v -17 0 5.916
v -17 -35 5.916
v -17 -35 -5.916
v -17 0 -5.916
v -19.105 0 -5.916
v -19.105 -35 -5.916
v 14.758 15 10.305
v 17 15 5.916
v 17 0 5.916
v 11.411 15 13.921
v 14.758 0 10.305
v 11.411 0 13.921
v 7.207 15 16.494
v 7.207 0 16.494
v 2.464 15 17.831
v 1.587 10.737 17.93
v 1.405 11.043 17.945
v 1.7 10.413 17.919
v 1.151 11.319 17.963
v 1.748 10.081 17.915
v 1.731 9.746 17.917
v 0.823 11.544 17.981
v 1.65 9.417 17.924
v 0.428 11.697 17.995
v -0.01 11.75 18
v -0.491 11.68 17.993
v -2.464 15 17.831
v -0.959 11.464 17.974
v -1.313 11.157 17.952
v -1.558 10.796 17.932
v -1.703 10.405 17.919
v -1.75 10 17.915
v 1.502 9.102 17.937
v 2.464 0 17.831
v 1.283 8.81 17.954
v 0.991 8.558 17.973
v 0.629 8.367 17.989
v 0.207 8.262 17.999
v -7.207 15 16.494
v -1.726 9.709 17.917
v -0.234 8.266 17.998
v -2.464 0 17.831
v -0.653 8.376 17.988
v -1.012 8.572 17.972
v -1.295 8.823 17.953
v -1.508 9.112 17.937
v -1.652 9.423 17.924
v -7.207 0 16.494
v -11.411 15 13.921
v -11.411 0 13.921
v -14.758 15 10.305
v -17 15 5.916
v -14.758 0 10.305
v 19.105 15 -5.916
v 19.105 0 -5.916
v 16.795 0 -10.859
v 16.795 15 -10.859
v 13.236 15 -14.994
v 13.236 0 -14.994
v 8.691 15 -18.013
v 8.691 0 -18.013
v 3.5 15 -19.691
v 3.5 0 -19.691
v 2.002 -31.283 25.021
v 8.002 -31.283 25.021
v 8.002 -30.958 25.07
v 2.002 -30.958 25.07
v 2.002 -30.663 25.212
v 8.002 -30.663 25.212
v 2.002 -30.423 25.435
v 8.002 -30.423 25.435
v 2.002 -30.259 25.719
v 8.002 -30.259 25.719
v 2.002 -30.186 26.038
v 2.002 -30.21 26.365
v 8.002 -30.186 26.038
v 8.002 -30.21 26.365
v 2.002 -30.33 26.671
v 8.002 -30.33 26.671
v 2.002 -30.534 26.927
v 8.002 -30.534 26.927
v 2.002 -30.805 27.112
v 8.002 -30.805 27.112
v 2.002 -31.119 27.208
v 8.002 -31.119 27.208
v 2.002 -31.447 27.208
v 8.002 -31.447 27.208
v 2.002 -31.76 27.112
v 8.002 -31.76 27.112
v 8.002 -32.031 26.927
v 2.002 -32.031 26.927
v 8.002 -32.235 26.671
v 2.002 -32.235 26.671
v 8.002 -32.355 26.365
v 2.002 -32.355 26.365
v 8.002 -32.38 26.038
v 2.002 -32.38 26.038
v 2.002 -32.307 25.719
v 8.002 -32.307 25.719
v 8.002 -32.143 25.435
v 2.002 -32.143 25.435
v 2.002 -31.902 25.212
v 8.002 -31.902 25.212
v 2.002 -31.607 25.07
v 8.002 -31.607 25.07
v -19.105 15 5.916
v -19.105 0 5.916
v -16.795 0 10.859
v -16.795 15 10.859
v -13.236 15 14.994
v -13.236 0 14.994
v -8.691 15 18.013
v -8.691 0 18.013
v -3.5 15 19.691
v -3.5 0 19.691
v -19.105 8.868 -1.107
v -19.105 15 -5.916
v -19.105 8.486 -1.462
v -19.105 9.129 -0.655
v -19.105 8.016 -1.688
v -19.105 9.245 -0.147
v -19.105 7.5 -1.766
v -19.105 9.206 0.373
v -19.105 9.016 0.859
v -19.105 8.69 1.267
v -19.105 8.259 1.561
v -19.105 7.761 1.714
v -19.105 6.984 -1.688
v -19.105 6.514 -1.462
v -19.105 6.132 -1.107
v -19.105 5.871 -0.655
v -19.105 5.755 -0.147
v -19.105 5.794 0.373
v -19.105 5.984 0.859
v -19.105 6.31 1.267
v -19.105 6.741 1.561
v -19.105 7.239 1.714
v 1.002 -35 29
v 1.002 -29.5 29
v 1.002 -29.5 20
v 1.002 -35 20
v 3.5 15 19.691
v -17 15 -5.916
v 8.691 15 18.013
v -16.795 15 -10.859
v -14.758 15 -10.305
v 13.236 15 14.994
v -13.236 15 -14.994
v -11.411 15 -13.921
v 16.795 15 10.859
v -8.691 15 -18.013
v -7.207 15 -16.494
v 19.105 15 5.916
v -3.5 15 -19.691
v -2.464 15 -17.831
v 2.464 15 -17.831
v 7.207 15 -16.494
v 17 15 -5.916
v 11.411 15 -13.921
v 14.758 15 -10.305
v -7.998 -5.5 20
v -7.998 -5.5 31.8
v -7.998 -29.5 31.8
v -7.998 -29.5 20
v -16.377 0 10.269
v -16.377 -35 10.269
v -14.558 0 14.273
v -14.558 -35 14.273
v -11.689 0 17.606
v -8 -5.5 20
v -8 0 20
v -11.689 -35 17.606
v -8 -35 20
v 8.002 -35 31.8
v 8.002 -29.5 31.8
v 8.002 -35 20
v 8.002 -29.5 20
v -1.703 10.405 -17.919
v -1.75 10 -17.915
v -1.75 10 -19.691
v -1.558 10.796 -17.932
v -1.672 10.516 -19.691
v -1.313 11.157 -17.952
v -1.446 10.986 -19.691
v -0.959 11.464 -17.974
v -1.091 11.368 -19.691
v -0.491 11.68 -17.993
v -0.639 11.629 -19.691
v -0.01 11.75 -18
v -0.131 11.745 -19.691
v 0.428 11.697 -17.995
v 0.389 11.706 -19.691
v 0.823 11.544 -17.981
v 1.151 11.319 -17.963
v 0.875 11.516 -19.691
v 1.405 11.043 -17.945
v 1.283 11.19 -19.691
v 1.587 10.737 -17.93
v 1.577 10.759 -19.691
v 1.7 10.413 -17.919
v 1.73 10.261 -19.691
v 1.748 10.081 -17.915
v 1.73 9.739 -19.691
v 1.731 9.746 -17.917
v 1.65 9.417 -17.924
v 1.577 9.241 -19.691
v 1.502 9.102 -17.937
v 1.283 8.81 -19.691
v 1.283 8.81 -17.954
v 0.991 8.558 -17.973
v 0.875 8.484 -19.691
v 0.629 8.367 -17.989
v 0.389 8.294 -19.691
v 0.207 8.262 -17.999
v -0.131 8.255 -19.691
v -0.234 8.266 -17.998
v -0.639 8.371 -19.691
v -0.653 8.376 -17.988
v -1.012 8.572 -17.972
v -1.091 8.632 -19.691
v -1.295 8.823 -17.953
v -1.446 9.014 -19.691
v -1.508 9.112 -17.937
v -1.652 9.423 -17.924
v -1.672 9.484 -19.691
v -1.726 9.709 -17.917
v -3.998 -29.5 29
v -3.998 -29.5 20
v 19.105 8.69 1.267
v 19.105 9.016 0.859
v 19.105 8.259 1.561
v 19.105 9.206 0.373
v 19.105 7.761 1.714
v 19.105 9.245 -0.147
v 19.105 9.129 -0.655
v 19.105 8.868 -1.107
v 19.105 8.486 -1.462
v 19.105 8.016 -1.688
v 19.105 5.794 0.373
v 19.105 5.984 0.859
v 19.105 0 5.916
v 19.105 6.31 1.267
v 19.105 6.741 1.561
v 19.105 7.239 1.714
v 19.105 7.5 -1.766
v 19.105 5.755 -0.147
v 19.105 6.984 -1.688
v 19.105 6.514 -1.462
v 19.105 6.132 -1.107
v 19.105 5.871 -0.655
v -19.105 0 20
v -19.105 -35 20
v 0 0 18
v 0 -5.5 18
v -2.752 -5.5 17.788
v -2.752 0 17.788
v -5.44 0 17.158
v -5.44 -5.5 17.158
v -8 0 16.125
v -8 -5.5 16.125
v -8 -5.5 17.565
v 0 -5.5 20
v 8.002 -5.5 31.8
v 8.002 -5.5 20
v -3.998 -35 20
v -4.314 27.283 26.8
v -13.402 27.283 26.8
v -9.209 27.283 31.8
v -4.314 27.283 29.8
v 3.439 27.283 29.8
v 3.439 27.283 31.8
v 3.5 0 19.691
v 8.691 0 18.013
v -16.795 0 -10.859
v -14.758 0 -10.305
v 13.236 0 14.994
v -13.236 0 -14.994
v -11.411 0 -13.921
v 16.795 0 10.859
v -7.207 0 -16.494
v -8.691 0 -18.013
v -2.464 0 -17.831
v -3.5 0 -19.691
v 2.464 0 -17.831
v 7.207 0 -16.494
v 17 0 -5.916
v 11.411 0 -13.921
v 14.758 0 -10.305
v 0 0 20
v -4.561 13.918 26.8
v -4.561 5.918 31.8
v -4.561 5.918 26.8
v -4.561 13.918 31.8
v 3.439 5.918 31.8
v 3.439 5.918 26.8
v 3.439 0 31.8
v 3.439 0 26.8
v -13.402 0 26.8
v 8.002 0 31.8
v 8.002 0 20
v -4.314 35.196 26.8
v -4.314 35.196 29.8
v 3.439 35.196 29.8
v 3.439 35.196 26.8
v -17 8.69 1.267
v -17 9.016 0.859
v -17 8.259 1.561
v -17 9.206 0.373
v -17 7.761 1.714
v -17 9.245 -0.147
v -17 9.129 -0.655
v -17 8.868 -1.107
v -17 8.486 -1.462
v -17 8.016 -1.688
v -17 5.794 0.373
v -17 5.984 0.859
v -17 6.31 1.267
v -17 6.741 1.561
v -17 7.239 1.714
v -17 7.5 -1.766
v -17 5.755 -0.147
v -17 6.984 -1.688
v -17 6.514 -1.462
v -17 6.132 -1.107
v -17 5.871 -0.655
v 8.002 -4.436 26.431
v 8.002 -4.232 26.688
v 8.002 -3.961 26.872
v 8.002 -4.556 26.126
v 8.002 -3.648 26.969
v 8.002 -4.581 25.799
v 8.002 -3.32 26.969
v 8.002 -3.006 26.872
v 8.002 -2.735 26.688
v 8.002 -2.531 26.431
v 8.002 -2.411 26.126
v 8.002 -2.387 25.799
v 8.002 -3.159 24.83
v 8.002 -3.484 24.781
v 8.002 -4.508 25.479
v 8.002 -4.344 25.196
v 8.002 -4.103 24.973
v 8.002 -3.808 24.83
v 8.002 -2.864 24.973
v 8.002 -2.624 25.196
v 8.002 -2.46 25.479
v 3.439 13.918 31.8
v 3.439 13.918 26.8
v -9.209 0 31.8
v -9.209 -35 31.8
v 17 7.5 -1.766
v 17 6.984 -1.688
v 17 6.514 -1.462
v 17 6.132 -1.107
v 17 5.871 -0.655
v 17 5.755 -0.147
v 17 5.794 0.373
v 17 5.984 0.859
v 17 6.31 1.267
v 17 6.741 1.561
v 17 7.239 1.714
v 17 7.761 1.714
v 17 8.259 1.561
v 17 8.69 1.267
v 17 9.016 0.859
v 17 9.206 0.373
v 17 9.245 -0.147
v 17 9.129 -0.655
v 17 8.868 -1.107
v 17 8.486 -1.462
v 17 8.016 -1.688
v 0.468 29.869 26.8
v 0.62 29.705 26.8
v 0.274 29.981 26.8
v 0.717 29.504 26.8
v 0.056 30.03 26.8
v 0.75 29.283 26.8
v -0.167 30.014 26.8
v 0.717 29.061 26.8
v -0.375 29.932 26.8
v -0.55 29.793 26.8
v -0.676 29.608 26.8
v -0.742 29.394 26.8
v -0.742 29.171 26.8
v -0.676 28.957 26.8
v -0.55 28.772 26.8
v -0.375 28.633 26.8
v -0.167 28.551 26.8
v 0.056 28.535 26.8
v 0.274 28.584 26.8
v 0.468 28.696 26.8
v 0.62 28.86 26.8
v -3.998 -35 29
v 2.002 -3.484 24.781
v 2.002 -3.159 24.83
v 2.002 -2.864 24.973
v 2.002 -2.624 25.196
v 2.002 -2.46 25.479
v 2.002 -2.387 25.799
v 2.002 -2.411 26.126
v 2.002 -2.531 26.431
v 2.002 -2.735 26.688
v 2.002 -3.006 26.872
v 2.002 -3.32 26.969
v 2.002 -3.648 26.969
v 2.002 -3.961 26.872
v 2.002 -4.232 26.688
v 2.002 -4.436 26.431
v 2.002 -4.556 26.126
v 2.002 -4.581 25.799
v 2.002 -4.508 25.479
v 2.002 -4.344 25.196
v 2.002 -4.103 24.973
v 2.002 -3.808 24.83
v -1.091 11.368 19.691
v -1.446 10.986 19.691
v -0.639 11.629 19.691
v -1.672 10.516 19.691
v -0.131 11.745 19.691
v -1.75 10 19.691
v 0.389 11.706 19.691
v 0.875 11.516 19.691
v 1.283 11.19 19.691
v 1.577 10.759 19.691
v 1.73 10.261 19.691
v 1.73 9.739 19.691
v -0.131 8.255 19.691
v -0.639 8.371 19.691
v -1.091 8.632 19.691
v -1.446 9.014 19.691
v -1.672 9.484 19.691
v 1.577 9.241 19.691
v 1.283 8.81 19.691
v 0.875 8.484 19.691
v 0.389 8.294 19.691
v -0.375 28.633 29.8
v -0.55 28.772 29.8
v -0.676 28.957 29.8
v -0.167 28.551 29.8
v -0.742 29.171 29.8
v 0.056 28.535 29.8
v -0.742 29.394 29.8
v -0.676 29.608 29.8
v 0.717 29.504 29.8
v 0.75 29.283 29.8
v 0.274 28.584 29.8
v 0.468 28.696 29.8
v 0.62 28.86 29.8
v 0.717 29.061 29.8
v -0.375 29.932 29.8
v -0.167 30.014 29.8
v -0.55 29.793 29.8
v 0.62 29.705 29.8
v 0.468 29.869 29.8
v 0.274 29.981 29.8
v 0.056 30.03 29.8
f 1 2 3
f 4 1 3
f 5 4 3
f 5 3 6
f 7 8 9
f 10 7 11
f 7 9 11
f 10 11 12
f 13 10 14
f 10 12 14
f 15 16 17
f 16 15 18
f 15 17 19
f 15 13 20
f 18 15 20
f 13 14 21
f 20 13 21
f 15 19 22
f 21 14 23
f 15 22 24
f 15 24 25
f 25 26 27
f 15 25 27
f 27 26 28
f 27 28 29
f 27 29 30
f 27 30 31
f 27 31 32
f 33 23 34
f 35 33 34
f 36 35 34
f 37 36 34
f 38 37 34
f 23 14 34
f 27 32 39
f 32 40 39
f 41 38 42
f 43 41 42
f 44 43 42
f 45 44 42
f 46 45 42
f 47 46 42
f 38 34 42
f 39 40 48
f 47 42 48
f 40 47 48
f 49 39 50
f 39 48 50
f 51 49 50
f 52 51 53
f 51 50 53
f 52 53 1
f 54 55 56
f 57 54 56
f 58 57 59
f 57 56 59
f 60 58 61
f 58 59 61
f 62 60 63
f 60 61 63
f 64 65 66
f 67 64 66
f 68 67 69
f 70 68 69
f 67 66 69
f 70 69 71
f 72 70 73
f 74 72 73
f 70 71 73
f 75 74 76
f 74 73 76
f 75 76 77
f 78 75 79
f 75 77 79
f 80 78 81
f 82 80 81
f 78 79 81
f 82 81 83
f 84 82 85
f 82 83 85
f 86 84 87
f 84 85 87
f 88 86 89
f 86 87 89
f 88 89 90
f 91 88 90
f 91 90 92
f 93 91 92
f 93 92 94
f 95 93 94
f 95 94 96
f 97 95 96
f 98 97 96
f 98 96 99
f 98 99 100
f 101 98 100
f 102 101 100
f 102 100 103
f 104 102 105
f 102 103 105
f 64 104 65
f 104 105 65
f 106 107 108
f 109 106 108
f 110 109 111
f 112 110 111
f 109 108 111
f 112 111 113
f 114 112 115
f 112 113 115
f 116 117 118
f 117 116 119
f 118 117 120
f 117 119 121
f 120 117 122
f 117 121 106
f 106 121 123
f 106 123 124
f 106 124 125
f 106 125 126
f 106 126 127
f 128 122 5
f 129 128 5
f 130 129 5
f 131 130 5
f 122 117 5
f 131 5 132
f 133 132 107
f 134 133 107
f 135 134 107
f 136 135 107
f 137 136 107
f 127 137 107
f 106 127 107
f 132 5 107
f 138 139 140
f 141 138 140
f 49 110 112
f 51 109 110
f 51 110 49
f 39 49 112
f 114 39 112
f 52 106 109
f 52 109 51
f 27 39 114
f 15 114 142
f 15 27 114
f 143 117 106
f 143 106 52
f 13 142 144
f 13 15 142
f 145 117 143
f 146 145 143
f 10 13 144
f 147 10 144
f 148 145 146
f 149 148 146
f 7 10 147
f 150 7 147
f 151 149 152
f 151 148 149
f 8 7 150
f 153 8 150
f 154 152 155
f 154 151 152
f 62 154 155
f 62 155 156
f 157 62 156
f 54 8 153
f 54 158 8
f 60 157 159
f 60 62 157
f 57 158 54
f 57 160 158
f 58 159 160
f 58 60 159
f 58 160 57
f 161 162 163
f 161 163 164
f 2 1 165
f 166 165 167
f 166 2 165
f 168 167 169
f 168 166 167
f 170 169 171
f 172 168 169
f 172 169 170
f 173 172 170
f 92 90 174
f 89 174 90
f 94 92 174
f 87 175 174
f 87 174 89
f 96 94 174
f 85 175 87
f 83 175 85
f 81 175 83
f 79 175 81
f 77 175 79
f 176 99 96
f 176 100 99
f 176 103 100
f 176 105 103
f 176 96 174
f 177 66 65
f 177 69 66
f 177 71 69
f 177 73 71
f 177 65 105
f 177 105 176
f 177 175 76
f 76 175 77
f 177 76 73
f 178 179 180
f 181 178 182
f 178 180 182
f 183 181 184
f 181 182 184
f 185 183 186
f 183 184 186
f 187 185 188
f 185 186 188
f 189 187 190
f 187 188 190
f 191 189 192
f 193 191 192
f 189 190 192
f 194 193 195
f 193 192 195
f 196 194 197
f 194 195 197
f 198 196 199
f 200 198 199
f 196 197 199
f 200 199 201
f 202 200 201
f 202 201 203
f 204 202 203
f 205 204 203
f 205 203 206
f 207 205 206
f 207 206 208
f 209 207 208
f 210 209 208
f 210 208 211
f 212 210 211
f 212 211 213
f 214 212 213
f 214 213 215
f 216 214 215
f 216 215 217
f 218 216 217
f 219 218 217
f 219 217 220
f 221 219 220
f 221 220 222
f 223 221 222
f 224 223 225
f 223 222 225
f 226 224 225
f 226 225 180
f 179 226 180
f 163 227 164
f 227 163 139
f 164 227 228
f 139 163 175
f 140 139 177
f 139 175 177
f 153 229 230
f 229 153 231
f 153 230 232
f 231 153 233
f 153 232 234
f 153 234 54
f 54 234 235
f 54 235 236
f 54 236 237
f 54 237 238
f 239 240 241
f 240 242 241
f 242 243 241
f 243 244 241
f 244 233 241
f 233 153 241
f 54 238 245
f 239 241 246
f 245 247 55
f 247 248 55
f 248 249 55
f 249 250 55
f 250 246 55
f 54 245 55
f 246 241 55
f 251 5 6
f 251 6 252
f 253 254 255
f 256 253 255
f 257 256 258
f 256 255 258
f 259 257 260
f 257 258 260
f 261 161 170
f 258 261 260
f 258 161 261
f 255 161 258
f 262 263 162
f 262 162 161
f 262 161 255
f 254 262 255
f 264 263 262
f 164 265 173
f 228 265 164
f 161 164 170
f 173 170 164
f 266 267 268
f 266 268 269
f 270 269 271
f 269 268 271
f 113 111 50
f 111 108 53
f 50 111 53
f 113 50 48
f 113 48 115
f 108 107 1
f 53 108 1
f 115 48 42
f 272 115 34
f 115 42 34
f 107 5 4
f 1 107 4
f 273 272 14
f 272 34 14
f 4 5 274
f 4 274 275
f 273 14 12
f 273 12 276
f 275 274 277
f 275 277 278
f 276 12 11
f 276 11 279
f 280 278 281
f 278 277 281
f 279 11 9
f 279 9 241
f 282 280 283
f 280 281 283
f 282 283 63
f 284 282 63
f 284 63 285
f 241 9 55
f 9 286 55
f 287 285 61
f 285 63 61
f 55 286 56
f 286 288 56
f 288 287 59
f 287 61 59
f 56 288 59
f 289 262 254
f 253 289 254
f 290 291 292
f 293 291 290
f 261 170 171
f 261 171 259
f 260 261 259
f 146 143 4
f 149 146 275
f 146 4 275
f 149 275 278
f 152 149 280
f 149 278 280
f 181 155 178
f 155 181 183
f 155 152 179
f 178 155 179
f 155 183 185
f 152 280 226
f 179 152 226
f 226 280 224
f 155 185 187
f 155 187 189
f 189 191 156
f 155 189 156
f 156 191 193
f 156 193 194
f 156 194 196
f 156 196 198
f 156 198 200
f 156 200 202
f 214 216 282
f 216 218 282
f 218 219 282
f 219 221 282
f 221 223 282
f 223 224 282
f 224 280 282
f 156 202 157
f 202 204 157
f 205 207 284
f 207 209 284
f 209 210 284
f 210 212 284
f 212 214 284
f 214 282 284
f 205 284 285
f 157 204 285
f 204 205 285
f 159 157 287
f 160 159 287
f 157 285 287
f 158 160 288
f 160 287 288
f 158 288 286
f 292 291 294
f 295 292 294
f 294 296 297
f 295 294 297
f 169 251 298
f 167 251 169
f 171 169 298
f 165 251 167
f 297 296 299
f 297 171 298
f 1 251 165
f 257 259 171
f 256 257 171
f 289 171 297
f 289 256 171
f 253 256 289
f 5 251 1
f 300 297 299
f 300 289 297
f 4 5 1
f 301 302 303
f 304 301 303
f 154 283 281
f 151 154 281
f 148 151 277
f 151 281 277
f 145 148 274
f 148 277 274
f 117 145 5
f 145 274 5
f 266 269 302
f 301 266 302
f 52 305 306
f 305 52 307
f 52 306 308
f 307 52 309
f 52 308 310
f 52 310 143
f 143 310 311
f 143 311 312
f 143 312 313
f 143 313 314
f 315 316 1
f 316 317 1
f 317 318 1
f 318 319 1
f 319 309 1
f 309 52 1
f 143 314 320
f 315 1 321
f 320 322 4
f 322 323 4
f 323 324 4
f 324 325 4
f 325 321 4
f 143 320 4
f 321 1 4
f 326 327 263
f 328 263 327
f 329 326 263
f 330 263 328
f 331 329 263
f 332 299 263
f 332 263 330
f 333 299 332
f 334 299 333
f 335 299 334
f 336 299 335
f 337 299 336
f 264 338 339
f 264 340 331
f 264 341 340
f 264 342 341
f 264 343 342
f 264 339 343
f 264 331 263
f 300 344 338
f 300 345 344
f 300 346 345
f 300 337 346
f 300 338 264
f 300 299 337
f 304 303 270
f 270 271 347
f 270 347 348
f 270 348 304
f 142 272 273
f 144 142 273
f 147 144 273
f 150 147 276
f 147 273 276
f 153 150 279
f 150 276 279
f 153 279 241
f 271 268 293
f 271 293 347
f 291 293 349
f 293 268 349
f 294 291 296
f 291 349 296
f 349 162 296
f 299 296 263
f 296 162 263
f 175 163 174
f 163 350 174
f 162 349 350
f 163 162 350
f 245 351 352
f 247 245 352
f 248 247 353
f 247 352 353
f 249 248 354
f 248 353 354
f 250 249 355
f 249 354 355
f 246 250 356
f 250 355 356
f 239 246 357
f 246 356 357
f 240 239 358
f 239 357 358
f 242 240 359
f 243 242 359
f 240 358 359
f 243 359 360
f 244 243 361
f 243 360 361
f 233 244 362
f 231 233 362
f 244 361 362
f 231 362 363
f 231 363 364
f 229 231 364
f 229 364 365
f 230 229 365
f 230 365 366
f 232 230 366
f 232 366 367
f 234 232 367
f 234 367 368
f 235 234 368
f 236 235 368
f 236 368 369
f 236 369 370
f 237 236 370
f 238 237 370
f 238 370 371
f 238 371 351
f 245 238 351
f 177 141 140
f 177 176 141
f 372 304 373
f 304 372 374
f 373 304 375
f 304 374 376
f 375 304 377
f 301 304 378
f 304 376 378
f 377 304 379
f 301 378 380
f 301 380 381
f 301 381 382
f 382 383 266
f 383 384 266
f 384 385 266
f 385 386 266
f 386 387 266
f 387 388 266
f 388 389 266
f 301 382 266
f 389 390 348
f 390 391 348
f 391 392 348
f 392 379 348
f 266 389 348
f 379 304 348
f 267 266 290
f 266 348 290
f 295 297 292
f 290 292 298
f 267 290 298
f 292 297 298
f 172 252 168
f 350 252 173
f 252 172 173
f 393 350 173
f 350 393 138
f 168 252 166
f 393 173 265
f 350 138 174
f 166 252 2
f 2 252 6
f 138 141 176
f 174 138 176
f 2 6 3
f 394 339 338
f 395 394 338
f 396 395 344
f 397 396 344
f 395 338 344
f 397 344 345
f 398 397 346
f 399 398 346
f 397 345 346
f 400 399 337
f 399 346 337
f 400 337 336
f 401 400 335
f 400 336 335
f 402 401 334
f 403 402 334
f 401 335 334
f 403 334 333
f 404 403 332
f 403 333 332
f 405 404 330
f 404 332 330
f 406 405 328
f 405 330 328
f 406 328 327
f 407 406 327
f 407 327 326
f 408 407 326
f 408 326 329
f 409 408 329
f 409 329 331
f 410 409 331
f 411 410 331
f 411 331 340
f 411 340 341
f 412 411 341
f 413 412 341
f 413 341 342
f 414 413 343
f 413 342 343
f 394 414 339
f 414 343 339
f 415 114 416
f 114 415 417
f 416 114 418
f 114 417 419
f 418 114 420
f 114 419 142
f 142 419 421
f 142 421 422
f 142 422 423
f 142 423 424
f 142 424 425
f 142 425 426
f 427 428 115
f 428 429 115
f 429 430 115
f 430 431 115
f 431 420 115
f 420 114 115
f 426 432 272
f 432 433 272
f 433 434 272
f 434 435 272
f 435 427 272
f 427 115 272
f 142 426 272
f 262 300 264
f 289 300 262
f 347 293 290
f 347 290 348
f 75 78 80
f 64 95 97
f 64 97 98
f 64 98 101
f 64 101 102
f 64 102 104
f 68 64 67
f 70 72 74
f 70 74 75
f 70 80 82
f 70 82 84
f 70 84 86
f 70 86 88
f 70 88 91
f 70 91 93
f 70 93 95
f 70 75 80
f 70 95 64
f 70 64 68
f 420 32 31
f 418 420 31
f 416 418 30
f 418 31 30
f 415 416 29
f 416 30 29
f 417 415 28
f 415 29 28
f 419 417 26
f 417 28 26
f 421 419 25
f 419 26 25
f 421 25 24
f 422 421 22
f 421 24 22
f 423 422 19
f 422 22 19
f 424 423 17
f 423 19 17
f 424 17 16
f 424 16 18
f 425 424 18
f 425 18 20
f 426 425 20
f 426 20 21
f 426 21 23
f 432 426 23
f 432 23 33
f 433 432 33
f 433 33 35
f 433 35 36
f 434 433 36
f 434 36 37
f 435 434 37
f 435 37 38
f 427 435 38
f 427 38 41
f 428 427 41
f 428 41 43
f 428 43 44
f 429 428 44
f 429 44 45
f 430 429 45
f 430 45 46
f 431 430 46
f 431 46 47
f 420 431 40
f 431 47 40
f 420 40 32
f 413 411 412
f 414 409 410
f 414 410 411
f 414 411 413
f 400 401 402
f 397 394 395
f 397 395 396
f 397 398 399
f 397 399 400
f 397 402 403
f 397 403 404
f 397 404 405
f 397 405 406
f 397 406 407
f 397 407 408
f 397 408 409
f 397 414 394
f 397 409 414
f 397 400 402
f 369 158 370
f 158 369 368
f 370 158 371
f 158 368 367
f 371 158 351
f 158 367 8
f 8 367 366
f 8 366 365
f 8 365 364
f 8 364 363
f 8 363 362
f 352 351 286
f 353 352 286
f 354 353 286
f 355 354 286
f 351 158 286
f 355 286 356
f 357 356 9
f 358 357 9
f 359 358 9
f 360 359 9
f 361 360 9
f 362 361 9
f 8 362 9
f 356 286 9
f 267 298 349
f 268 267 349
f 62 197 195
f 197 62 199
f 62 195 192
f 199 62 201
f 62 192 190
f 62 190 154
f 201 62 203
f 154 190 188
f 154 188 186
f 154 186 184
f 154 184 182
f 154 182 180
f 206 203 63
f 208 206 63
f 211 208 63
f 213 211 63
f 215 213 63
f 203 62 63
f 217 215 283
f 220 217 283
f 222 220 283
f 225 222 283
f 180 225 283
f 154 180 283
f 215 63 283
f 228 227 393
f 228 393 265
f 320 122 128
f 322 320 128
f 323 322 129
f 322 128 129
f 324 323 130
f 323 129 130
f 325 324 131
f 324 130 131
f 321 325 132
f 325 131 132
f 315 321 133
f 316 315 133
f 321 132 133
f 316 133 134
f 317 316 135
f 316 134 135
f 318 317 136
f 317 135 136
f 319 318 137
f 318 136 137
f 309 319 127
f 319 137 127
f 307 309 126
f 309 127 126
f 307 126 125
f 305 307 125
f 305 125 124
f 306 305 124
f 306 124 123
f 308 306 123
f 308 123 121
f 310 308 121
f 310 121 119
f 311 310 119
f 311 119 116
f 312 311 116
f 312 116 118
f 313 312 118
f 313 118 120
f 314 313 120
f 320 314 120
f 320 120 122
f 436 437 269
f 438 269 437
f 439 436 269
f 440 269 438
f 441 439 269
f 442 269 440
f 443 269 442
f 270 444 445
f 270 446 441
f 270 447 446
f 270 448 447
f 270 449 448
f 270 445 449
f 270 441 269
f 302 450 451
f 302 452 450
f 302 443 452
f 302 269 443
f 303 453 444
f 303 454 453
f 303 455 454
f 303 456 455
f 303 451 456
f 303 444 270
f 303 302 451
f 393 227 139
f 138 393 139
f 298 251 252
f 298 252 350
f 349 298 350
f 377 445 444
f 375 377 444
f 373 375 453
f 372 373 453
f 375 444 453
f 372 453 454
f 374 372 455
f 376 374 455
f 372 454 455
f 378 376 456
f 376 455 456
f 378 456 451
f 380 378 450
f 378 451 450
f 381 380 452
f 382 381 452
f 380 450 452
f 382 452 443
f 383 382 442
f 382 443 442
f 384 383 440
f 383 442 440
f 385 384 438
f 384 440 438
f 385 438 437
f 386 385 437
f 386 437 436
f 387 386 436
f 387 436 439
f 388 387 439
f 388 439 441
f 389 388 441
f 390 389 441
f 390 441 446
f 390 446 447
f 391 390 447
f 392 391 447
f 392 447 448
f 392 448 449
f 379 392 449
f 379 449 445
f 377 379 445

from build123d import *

# Parameters (mm, degrees)
BOSS_EXTRUDE2_DEPTH = 15
BOSS_EXTRUDE3_DEPTH = 35
BOSS_EXTRUDE4_START = -35
BOSS_EXTRUDE4_DEPTH = 35
SKETCH2_W           = 11.8
SKETCH2_H           = 24
CUT_EXTRUDE1_DEPTH  = 16
SKETCH5_W           = 2.43477795
SKETCH5_H           = 29.688989587
CUT_EXTRUDE7_DEPTH  = 8
SKETCH6_W           = 4.317840387
SKETCH6_H           = 1.457155793
CUT_EXTRUDE8_DEPTH  = 29.5
BOSS_EXTRUDE6_DEPTH = 40
SKETCH8_W           = 7.752712761
SKETCH8_H           = 12.717464329
CUT_EXTRUDE9_DEPTH  = 2
CUT_EXTRUDE10_START = -15
CUT_EXTRUDE10_DEPTH = 15
SKETCH10_W          = 5
SKETCH10_H          = 9
CUT_EXTRUDE11_DEPTH = 10
SKETCH11_W          = 9.088902154
SKETCH11_H          = 12.717464329
CUT_EXTRUDE12_DEPTH = 5
SKETCH12_R          = 1.75
CUT_EXTRUDE13_DEPTH = 40
CUT_EXTRUDE14_DEPTH = 35
SKETCH15_R          = 1.75
CUT_EXTRUDE15_DEPTH = 60
SKETCH17_R          = 1.1
CUT_EXTRUDE17_DEPTH = 6
SKETCH18_R          = 1.1
CUT_EXTRUDE18_DEPTH = 6
SKETCH20_W          = 7.752712761
SKETCH20_H          = 4.803785243
CUT_EXTRUDE19_DEPTH = 5
SKETCH19_R          = 0.75
CUT_EXTRUDE20_DEPTH = 5
SKETCH21_W          = 8
SKETCH21_H          = 8
CUT_EXTRUDE21_DEPTH = 10


with BuildPart() as part:
    # Sketch1 → Boss-Extrude2 (new body)
    with BuildSketch(Plane(origin=(0, 0, 0), x_dir=(1, 0, 0), z_dir=(0, 1, 0))):
        with BuildLine():
            ThreePointArc((-3.5, 19.691368668), (-13.235779124, 14.993803753), (-19.104973175, 5.916079783))
            Line((-19.104973175, 5.916079783), (-19.104973175, -5.916079783))
            ThreePointArc((-19.104973175, -5.916079783), (0, -20), (19.104973175, -5.916079783))
            Line((19.104973175, -5.916079783), (19.104973175, 5.916079783))
            ThreePointArc((19.104973175, 5.916079783), (13.235779124, 14.993803753), (3.5, 19.691368668))
            Line((3.5, 19.691368668), (-3.5, 19.691368668))
        make_face()
        with BuildLine():
            ThreePointArc((-17, 5.916079783), (0, 18), (17, 5.916079783))
            Line((17, 5.916079783), (17, -5.916079783))
            ThreePointArc((17, -5.916079783), (0, -18), (-17, -5.916079783))
            Line((-17, -5.916079783), (-17, 5.916079783))
        make_face(mode=Mode.SUBTRACT)
    extrude(amount=BOSS_EXTRUDE2_DEPTH)

    # Sketch9 → Cut-Extrude10 (cut)
    with BuildSketch(Plane(origin=(0, 15, 0), x_dir=(1, 0, 0), z_dir=(0, 1, 0)).offset(CUT_EXTRUDE10_START)):
        with BuildLine():
            Line((-3.5, -19.691368668), (3.5, -19.691368668))
            ThreePointArc((3.5, -19.691368668), (0, -20), (-3.5, -19.691368668))
        make_face()
    extrude(amount=CUT_EXTRUDE10_DEPTH, mode=Mode.SUBTRACT)

    # Sketch12 → Cut-Extrude13 (cut)
    with BuildSketch(Plane.ZY.offset(19.104973175)):
        with Locations((-0.016079783, 7.5)):
            Circle(SKETCH12_R)
    extrude(amount=-CUT_EXTRUDE13_DEPTH, mode=Mode.SUBTRACT)

    # Sketch15 → Cut-Extrude15 (cut)
    with BuildSketch(Plane(origin=(0, 0, -19.691368668), x_dir=(-1, 0, 0), z_dir=(0, 0, -1))):
        with Locations((0, 10)):
            Circle(SKETCH15_R)
    extrude(amount=-CUT_EXTRUDE15_DEPTH, mode=Mode.SUBTRACT)


with BuildPart() as body_2:
    # Sketch1<3> → Boss-Extrude3 (new body)
    with BuildSketch(Plane(origin=(0, 0, 0), x_dir=(1, 0, 0), z_dir=(0, 1, 0))):
        with BuildLine():
            Line((8.001725225, -20), (0, -20))
            ThreePointArc((0, -20), (-11.867569345, -16.09847191), (-19.104973175, -5.916079783))
            Line((-19.104973175, -5.916079783), (-19.104973175, -20))
            Line((-19.104973175, -20), (-9.209366103, -31.8))
            Line((-9.209366103, -31.8), (8.001725225, -31.8))
            Line((8.001725225, -31.8), (8.001725225, -20))
        make_face()
    extrude(amount=-BOSS_EXTRUDE3_DEPTH)

    # Sketch1<4> → Boss-Extrude4 (add)
    with BuildSketch(Plane(origin=(0, 0, 0), x_dir=(1, 0, 0), z_dir=(0, 1, 0)).offset(BOSS_EXTRUDE4_START)):
        with BuildLine():
            Line((-17, -5.916079783), (-17, 5.916079783))
            Line((-17, 5.916079783), (-19.104973175, 5.916079783))
            Line((-19.104973175, 5.916079783), (-19.104973175, -5.916079783))
            ThreePointArc((-19.104973175, -5.916079783), (-11.867569345, -16.09847191), (0, -20))
            Line((0, -20), (0, -18))
            ThreePointArc((0, -18), (-10.428580054, -14.671220742), (-17, -5.916079783))
        make_face()
    extrude(amount=BOSS_EXTRUDE4_DEPTH)

    # Sketch2 → Cut-Extrude1 (cut)
    with BuildSketch(Plane(origin=(8.001725225, 0, 0), x_dir=(0, 0, -1), z_dir=(1, 0, 0))):
        with Locations((-25.9, -17.5)):
            Rectangle(SKETCH2_W, SKETCH2_H)
    extrude(amount=-CUT_EXTRUDE1_DEPTH, mode=Mode.SUBTRACT)

    # Sketch5 → Cut-Extrude7 (cut)
    with BuildSketch(Plane(origin=(0, 0, 0), x_dir=(0, 0, -1), z_dir=(1, 0, 0))):
        with Locations((-18.782611025, -20.344494794)):
            Rectangle(SKETCH5_W, SKETCH5_H)
    extrude(amount=-CUT_EXTRUDE7_DEPTH, mode=Mode.SUBTRACT)

    # Sketch6 → Cut-Extrude8 (cut)
    with BuildSketch(Plane(origin=(0, -35, 0), x_dir=(-1, 0, 0), z_dir=(0, -1, 0))):
        with Locations((5.841079806, -16.836644154)):
            Rectangle(SKETCH6_W, SKETCH6_H)
    extrude(amount=-CUT_EXTRUDE8_DEPTH, mode=Mode.SUBTRACT)

    # Sketch7 → Boss-Extrude6 (add)
    with BuildSketch(Plane(origin=(0, 0, 0), x_dir=(1, 0, 0), z_dir=(0, 1, 0))):
        Polygon((-13.402419947, -26.8), (-9.209366103, -31.8), (3.439194968, -31.8), (3.439194968, -26.8), align=None)
    extrude(amount=BOSS_EXTRUDE6_DEPTH)

    # Sketch8 → Cut-Extrude9 (cut)
    with BuildSketch(Plane.XY.offset(31.8)):
        with Locations((-0.437161412, 33.641267836)):
            Rectangle(SKETCH8_W, SKETCH8_H)
    extrude(amount=-CUT_EXTRUDE9_DEPTH, mode=Mode.SUBTRACT)

    # Sketch10 → Cut-Extrude11 (cut)
    with BuildSketch(Plane(origin=(0, -29.5, 0), x_dir=(1, 0, 0), z_dir=(0, 1, 0))):
        with Locations((-1.498274775, -24.5)):
            Rectangle(SKETCH10_W, SKETCH10_H)
    extrude(amount=-CUT_EXTRUDE11_DEPTH, mode=Mode.SUBTRACT)

    # Sketch11 → Cut-Extrude12 (cut)
    with BuildSketch(Plane.XY.offset(31.8)):
        with Locations((-8.85796887, 33.641267836)):
            Rectangle(SKETCH11_W, SKETCH11_H)
    extrude(amount=-CUT_EXTRUDE12_DEPTH, mode=Mode.SUBTRACT)

    # Sketch14 → Cut-Extrude14 (cut)
    with BuildSketch(Plane.XZ.offset(35)):
        with BuildLine():
            Line((-8, 20), (-8, 16.124515497))
            ThreePointArc((-8, 16.124515497), (-13.501964299, 11.903653224), (-17, 5.916079783))
            ThreePointArc((-17, 5.916079783), (-14.557856547, 14.273065015), (-8, 20))
        make_face()
    extrude(amount=-CUT_EXTRUDE14_DEPTH, mode=Mode.SUBTRACT)

    # Sketch17 → Cut-Extrude17 (cut)
    with BuildSketch(Plane(origin=(8.001725225, 0, 0), x_dir=(0, 0, -1), z_dir=(1, 0, 0))):
        with Locations((-25.881365085, -3.483670033)):
            Circle(SKETCH17_R)
    extrude(amount=-CUT_EXTRUDE17_DEPTH, mode=Mode.SUBTRACT)

    # Sketch18 → Cut-Extrude18 (cut)
    with BuildSketch(Plane(origin=(8.001725225, 0, 0), x_dir=(0, 0, -1), z_dir=(1, 0, 0))):
        with Locations((-26.120651669, -31.282640193)):
            Circle(SKETCH18_R)
    extrude(amount=-CUT_EXTRUDE18_DEPTH, mode=Mode.SUBTRACT)

    # Sketch20 → Cut-Extrude19 (cut)
    with BuildSketch(Plane.XY.offset(29.8)):
        with Locations((-0.437161412, 37.598107379)):
            Rectangle(SKETCH20_W, SKETCH20_H)
    extrude(amount=-CUT_EXTRUDE19_DEPTH, mode=Mode.SUBTRACT)

    # Sketch19 → Cut-Extrude20 (cut)
    with BuildSketch(Plane.XY.offset(29.8)):
        with Locations((0, 29.282535671)):
            Circle(SKETCH19_R)
    extrude(amount=-CUT_EXTRUDE20_DEPTH, mode=Mode.SUBTRACT)

    # Sketch21 → Cut-Extrude21 (cut)
    with BuildSketch(Plane.XY.offset(31.8)):
        with Locations((-0.560805032, 9.918151688)):
            Rectangle(SKETCH21_W, SKETCH21_H)
    extrude(amount=-CUT_EXTRUDE21_DEPTH, mode=Mode.SUBTRACT)


solid = Compound([part.part, body_2.part])
